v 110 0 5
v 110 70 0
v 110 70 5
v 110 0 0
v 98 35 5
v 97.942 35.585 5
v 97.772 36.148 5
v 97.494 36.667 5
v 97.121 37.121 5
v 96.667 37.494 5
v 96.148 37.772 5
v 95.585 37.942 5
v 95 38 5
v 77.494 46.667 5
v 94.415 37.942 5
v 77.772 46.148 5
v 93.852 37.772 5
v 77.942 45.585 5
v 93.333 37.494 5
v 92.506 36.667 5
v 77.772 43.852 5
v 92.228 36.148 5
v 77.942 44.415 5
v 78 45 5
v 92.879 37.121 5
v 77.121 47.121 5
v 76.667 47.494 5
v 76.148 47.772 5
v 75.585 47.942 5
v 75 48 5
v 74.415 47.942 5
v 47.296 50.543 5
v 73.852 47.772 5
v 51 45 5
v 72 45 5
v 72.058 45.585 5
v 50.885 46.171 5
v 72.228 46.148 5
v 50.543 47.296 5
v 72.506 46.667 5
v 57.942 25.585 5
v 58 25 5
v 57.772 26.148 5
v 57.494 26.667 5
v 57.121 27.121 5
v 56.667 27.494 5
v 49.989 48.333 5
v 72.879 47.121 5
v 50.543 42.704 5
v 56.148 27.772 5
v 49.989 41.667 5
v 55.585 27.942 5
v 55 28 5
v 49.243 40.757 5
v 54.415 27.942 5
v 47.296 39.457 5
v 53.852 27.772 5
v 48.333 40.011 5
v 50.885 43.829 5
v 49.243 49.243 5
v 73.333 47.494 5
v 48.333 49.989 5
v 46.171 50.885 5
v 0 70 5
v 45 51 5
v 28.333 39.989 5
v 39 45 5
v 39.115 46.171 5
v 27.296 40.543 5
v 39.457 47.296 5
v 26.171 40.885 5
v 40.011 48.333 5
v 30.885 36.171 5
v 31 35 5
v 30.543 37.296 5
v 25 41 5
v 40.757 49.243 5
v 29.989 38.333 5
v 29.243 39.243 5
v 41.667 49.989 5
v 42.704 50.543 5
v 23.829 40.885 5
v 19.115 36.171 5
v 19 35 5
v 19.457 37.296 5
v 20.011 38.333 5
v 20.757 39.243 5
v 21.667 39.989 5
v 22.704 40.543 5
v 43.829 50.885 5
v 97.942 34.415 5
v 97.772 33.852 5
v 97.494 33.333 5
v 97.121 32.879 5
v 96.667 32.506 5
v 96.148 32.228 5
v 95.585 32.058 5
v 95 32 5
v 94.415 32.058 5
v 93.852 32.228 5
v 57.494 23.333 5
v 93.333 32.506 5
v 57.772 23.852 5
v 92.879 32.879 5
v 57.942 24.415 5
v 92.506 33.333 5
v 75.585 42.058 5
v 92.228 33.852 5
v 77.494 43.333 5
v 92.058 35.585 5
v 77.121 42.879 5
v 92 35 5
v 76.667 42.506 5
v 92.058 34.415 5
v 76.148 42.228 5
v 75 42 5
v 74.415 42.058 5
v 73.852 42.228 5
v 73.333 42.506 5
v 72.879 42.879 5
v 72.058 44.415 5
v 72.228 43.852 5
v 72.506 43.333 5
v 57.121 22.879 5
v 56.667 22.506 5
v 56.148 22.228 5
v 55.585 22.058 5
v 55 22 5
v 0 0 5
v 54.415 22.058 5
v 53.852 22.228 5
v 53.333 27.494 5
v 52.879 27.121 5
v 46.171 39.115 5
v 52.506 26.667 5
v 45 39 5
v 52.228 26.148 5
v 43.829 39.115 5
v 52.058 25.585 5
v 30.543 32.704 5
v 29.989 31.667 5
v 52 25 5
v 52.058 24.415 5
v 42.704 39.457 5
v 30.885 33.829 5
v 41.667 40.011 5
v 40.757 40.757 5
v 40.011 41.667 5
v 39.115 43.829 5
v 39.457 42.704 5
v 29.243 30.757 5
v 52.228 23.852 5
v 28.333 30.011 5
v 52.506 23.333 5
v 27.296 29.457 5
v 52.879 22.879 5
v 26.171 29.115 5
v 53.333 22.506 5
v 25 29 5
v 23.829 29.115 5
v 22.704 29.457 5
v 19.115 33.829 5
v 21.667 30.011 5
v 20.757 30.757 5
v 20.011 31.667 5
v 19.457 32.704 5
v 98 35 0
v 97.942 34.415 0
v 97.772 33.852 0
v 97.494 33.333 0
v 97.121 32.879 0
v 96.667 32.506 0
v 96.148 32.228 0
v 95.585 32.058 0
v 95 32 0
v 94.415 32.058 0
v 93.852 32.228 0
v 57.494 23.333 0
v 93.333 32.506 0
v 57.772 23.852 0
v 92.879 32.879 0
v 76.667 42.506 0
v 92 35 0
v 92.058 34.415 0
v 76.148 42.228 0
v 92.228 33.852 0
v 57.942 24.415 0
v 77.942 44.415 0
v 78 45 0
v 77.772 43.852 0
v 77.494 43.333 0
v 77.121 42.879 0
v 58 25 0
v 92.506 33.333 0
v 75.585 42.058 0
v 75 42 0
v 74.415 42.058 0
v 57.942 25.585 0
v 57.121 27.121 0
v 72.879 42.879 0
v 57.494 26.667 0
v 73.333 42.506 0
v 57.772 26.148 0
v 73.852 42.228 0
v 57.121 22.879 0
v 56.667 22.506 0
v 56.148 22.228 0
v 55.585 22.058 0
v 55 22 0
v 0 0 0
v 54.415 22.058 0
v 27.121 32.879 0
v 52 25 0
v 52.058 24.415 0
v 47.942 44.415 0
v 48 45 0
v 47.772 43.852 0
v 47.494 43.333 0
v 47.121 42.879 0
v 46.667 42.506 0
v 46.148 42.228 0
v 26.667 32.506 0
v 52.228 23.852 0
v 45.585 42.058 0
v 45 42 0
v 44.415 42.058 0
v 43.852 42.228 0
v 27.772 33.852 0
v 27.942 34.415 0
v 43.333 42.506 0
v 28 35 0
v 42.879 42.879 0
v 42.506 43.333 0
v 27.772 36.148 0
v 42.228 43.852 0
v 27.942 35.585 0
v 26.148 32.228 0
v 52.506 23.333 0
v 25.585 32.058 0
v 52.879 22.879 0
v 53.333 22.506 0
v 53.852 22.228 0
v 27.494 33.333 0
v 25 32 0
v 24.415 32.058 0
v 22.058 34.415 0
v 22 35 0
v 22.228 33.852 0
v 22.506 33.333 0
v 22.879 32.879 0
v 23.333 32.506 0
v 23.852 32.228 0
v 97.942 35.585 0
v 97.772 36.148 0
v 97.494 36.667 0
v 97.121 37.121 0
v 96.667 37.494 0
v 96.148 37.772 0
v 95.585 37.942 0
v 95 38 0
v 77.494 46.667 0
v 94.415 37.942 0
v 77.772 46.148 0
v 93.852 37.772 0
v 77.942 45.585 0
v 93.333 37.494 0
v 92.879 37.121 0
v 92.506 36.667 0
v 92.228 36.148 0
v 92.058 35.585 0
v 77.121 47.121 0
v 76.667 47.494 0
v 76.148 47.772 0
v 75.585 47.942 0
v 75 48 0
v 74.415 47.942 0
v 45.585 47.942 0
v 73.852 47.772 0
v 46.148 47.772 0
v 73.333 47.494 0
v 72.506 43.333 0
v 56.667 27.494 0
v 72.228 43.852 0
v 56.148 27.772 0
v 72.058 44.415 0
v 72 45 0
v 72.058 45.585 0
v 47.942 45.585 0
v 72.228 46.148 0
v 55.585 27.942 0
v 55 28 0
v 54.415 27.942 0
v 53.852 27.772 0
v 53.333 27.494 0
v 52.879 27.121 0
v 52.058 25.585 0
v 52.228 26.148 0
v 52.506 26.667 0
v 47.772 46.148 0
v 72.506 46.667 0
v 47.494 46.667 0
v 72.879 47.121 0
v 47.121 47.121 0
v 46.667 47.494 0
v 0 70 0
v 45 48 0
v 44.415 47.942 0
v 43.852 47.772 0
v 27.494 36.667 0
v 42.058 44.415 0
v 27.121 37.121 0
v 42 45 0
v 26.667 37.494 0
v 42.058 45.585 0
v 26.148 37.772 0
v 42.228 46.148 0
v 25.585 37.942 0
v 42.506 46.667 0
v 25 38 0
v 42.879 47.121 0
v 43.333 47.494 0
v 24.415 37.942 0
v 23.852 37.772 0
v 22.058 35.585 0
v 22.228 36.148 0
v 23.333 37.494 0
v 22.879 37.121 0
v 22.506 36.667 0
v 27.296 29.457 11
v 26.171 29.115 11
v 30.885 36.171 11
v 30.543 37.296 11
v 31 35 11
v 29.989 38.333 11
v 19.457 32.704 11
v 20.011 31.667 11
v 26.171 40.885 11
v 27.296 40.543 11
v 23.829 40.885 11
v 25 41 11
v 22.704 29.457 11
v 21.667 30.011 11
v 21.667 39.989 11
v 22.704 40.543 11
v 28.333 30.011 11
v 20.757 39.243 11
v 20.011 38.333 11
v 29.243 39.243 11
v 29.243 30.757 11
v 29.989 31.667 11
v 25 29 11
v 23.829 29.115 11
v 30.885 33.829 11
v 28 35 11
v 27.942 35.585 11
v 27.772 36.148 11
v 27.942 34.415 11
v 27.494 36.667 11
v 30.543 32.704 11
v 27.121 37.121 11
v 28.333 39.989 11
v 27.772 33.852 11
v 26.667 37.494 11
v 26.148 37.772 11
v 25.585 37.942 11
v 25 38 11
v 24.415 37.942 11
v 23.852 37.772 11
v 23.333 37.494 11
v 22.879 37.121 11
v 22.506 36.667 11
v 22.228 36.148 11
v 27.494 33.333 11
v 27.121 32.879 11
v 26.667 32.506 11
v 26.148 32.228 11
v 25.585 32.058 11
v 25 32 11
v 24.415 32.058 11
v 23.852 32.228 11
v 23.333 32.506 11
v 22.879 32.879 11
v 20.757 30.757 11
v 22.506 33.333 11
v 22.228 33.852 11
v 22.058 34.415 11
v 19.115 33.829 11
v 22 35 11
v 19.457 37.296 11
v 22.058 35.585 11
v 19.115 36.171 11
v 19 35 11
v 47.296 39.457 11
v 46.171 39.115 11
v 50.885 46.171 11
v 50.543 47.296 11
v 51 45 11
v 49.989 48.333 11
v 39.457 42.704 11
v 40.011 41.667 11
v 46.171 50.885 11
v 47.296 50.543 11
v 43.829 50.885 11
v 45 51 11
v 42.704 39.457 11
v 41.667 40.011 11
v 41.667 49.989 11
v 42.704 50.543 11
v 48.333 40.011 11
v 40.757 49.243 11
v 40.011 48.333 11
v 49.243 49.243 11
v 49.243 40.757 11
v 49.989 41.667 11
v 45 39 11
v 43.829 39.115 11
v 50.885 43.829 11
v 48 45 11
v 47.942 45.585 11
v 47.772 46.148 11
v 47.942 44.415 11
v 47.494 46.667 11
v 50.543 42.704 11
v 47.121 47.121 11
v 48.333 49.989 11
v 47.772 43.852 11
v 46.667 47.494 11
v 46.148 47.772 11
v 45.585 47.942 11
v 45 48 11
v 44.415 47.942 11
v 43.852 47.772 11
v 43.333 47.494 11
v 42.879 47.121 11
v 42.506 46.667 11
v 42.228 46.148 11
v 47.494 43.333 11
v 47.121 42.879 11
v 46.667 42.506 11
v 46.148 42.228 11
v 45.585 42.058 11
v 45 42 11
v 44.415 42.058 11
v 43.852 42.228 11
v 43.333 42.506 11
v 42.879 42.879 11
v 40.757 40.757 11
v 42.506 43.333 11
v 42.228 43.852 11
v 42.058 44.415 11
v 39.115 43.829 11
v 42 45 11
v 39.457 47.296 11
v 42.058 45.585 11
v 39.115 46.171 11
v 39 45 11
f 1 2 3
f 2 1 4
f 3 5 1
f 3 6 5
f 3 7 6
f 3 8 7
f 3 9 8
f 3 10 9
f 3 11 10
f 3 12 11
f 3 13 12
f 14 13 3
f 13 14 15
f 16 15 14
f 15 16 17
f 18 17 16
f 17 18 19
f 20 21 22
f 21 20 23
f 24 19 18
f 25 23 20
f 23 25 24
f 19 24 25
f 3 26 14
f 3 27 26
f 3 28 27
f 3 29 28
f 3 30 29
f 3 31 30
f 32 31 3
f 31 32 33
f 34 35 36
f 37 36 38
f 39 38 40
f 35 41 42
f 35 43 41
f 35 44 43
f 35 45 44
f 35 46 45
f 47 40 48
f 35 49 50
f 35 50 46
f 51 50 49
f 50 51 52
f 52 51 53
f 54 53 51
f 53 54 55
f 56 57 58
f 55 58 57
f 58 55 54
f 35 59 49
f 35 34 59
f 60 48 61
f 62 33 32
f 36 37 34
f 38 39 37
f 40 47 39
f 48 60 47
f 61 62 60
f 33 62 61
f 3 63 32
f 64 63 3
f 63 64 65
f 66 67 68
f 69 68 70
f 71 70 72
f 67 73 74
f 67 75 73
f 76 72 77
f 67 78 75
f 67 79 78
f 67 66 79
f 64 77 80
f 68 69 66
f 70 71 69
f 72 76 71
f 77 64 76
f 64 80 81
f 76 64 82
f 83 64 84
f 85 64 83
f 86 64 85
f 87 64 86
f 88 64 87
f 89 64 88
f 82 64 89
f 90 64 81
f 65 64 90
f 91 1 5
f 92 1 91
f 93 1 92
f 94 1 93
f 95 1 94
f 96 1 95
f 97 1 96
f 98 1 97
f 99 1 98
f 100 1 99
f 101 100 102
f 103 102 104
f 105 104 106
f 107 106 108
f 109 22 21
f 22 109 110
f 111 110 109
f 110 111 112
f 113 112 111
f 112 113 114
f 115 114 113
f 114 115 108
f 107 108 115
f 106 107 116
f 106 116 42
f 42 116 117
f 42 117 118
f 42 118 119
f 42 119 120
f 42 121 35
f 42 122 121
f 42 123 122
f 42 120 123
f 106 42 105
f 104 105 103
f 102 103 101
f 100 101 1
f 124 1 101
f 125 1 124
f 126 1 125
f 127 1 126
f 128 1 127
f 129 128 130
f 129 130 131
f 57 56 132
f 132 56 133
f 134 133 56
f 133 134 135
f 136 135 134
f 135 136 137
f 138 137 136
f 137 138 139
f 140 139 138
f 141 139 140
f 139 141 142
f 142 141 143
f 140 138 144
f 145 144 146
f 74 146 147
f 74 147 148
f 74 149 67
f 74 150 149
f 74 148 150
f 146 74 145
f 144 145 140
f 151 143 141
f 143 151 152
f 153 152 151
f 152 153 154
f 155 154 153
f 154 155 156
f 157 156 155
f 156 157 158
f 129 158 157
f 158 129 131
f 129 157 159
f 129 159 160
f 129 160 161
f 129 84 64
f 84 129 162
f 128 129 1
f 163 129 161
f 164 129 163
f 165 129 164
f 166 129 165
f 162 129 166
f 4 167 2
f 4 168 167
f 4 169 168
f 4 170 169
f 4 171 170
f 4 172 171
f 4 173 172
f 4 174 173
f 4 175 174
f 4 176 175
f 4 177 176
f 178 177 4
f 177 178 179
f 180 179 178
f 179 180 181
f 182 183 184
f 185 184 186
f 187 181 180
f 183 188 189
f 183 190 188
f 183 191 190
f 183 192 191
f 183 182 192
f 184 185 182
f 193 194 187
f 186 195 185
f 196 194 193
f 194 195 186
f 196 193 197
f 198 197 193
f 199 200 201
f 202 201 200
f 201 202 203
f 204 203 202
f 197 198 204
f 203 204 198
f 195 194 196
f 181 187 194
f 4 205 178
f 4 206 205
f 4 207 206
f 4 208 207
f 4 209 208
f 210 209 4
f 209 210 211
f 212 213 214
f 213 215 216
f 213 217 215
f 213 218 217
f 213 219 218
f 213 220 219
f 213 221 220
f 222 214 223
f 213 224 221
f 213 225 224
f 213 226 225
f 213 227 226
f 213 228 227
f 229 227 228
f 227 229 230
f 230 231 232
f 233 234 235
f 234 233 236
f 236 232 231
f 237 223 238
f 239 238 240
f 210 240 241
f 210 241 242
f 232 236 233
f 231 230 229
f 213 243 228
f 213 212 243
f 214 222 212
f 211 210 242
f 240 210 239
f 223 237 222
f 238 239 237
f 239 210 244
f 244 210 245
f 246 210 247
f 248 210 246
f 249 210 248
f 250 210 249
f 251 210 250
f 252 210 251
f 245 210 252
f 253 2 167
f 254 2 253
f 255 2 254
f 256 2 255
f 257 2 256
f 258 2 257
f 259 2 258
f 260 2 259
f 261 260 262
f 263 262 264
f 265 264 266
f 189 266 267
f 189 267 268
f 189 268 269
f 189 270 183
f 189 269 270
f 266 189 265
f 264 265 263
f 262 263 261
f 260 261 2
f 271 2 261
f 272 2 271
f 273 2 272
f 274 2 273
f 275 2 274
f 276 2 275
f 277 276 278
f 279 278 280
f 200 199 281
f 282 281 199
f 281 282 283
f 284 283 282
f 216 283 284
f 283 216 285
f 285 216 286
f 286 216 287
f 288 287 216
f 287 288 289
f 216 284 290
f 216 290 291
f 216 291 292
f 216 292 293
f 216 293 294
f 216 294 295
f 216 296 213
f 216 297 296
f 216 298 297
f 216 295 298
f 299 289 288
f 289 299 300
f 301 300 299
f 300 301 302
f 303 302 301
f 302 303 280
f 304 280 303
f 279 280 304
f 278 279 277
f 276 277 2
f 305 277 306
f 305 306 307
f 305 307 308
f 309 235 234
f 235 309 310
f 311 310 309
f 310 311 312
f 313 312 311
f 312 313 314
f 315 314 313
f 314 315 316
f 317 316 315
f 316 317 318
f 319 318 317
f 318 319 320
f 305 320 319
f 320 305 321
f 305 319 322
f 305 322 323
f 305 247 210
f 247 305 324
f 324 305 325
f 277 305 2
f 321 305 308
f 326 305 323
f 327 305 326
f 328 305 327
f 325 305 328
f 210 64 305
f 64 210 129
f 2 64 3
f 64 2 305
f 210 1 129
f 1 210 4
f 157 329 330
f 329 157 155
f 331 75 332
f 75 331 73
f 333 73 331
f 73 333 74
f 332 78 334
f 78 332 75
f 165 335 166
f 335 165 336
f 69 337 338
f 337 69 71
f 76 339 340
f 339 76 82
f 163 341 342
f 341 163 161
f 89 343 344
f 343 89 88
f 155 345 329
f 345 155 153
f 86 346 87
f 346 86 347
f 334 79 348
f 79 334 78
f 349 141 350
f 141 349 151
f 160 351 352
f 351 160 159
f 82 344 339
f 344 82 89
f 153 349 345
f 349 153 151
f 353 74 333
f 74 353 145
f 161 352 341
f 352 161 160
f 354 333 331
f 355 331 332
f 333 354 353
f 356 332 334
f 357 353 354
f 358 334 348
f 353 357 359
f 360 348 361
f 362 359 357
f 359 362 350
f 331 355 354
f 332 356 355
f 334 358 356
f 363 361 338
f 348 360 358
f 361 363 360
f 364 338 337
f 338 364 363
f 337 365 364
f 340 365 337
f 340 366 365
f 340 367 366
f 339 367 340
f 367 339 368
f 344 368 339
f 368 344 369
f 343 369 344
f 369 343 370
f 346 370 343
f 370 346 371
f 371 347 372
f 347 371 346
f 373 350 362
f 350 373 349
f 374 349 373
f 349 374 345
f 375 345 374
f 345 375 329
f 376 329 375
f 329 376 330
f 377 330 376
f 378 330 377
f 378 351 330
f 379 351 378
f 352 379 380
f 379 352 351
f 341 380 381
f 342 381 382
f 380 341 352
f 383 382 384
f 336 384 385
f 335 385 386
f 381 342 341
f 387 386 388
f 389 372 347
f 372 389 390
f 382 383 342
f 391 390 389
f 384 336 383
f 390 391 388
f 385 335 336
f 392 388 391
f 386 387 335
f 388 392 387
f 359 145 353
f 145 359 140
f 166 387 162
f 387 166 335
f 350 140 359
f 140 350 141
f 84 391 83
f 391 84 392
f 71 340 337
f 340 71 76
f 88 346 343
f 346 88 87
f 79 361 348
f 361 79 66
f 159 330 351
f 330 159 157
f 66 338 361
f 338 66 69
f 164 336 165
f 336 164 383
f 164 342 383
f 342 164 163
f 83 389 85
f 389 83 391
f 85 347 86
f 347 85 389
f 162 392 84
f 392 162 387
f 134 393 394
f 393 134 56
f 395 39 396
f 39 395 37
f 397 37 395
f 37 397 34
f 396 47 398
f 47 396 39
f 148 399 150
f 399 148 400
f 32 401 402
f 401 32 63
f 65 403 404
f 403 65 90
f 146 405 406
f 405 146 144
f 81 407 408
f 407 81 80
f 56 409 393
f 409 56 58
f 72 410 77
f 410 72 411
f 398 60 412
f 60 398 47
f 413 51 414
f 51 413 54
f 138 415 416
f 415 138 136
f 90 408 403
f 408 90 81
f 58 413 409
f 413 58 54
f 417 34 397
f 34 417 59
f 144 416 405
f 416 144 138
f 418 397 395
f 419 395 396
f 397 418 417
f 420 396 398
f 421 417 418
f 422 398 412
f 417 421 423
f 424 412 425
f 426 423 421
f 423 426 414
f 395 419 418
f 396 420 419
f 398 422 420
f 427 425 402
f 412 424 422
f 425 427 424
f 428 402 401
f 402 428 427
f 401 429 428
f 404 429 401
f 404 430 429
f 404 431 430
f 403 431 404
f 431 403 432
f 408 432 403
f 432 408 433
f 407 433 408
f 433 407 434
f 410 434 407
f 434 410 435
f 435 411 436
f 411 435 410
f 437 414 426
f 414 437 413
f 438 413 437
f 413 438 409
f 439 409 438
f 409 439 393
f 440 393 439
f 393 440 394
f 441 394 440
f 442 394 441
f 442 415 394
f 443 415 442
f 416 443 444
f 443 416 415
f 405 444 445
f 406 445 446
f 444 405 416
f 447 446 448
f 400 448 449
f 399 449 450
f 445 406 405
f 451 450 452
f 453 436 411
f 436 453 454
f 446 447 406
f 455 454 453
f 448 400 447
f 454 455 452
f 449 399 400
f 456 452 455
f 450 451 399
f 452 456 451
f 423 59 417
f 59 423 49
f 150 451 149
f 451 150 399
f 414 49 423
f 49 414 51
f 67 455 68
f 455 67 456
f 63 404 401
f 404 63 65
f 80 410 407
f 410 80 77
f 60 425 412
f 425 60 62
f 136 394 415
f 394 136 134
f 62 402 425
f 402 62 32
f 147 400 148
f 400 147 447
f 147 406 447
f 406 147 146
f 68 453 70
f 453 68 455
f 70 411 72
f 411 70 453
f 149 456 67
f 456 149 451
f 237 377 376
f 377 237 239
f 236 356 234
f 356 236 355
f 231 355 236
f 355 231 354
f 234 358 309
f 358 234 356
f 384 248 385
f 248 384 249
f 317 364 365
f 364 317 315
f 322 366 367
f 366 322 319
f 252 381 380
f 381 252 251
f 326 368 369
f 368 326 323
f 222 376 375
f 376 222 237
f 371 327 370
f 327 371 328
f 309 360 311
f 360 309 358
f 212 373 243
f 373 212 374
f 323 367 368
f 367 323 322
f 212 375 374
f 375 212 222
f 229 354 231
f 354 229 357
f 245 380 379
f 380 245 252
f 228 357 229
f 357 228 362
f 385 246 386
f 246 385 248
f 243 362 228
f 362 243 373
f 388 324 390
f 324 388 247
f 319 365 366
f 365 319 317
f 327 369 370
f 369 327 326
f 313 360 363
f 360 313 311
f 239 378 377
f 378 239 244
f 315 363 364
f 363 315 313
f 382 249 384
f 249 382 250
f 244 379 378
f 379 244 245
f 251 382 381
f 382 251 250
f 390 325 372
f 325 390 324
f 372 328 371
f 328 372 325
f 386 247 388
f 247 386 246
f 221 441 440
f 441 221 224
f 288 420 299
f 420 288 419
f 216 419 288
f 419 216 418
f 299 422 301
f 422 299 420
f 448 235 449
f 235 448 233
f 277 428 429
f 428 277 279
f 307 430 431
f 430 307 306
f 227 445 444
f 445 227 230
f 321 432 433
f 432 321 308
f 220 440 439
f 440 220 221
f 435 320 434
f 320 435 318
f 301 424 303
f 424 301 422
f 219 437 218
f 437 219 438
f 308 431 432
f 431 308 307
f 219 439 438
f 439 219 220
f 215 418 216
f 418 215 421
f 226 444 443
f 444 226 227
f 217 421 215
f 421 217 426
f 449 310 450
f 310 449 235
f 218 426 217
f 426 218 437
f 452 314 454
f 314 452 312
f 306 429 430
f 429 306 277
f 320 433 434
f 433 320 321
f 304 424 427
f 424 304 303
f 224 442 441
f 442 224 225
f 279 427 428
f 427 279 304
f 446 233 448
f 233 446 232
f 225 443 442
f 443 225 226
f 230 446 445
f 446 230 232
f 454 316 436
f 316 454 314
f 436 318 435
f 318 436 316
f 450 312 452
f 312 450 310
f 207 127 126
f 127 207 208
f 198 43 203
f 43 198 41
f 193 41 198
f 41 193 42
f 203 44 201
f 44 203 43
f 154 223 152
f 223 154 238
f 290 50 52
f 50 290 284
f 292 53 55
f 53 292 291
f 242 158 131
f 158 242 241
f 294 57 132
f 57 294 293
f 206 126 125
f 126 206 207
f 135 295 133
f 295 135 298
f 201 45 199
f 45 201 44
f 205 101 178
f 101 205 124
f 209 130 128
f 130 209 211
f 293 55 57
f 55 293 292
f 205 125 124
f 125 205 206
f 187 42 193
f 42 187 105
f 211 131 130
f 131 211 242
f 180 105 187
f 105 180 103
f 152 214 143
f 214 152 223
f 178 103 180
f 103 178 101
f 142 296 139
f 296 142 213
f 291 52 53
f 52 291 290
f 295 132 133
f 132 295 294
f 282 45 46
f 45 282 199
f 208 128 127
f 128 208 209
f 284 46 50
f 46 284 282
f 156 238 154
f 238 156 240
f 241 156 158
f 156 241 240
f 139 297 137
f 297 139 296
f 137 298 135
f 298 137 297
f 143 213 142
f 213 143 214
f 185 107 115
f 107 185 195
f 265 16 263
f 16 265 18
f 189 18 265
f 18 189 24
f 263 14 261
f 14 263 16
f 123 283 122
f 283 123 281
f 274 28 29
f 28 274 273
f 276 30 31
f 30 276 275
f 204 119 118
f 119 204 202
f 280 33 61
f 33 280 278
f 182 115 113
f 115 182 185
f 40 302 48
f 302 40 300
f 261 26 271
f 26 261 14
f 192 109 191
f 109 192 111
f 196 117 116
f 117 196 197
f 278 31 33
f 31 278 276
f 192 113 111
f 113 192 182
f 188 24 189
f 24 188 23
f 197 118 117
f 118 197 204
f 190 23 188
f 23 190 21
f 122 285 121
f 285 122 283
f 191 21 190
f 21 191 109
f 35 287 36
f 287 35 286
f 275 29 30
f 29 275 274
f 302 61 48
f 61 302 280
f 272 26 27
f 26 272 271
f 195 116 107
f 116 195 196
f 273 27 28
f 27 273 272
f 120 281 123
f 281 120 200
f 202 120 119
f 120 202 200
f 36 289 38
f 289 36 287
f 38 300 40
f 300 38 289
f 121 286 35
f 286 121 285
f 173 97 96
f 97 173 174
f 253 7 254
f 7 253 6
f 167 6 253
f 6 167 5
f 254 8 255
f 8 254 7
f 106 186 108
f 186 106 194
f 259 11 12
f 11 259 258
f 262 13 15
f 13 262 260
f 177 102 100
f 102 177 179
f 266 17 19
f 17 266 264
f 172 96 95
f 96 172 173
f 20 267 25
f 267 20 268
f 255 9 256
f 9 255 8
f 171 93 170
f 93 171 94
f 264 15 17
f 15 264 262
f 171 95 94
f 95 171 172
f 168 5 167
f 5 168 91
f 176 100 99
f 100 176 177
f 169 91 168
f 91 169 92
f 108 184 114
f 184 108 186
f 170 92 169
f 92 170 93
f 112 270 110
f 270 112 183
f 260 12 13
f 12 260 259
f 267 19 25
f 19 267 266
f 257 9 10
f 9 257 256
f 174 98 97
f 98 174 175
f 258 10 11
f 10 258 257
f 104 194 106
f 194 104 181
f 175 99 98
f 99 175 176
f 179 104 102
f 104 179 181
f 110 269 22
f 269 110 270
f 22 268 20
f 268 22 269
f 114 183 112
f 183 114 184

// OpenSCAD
$fn = 32;

// ----------------------------------------------------------------------
// Mixed field: bosses and holes at given coordinates
// ----------------------------------------------------------------------

// --- parameters (mm) ---
plate_l = 110;            // plate length, X
plate_w = 70;             // plate width, Y
plate_t = 5;              // plate thickness, Z
boss_d = 12;              // boss diameter
boss_h = 6;               // boss height above the plate
hole_d = 6;               // through hole diameter

total_h = plate_t + boss_h;  // overall height

difference() {
  union() {
    cube([plate_l, plate_w, plate_t]);
    translate([25, 35, plate_t]) cylinder(h = boss_h, d = boss_d);
    translate([45, 45, plate_t]) cylinder(h = boss_h, d = boss_d);
  }
  translate([25, 35, -1]) cylinder(h = total_h + 2, d = boss_d / 2);
  translate([45, 45, -1]) cylinder(h = total_h + 2, d = boss_d / 2);
  translate([55, 25, -1]) cylinder(h = plate_t + 2, d = hole_d);
  translate([75, 45, -1]) cylinder(h = plate_t + 2, d = hole_d);
  translate([95, 35, -1]) cylinder(h = plate_t + 2, d = hole_d);
}
